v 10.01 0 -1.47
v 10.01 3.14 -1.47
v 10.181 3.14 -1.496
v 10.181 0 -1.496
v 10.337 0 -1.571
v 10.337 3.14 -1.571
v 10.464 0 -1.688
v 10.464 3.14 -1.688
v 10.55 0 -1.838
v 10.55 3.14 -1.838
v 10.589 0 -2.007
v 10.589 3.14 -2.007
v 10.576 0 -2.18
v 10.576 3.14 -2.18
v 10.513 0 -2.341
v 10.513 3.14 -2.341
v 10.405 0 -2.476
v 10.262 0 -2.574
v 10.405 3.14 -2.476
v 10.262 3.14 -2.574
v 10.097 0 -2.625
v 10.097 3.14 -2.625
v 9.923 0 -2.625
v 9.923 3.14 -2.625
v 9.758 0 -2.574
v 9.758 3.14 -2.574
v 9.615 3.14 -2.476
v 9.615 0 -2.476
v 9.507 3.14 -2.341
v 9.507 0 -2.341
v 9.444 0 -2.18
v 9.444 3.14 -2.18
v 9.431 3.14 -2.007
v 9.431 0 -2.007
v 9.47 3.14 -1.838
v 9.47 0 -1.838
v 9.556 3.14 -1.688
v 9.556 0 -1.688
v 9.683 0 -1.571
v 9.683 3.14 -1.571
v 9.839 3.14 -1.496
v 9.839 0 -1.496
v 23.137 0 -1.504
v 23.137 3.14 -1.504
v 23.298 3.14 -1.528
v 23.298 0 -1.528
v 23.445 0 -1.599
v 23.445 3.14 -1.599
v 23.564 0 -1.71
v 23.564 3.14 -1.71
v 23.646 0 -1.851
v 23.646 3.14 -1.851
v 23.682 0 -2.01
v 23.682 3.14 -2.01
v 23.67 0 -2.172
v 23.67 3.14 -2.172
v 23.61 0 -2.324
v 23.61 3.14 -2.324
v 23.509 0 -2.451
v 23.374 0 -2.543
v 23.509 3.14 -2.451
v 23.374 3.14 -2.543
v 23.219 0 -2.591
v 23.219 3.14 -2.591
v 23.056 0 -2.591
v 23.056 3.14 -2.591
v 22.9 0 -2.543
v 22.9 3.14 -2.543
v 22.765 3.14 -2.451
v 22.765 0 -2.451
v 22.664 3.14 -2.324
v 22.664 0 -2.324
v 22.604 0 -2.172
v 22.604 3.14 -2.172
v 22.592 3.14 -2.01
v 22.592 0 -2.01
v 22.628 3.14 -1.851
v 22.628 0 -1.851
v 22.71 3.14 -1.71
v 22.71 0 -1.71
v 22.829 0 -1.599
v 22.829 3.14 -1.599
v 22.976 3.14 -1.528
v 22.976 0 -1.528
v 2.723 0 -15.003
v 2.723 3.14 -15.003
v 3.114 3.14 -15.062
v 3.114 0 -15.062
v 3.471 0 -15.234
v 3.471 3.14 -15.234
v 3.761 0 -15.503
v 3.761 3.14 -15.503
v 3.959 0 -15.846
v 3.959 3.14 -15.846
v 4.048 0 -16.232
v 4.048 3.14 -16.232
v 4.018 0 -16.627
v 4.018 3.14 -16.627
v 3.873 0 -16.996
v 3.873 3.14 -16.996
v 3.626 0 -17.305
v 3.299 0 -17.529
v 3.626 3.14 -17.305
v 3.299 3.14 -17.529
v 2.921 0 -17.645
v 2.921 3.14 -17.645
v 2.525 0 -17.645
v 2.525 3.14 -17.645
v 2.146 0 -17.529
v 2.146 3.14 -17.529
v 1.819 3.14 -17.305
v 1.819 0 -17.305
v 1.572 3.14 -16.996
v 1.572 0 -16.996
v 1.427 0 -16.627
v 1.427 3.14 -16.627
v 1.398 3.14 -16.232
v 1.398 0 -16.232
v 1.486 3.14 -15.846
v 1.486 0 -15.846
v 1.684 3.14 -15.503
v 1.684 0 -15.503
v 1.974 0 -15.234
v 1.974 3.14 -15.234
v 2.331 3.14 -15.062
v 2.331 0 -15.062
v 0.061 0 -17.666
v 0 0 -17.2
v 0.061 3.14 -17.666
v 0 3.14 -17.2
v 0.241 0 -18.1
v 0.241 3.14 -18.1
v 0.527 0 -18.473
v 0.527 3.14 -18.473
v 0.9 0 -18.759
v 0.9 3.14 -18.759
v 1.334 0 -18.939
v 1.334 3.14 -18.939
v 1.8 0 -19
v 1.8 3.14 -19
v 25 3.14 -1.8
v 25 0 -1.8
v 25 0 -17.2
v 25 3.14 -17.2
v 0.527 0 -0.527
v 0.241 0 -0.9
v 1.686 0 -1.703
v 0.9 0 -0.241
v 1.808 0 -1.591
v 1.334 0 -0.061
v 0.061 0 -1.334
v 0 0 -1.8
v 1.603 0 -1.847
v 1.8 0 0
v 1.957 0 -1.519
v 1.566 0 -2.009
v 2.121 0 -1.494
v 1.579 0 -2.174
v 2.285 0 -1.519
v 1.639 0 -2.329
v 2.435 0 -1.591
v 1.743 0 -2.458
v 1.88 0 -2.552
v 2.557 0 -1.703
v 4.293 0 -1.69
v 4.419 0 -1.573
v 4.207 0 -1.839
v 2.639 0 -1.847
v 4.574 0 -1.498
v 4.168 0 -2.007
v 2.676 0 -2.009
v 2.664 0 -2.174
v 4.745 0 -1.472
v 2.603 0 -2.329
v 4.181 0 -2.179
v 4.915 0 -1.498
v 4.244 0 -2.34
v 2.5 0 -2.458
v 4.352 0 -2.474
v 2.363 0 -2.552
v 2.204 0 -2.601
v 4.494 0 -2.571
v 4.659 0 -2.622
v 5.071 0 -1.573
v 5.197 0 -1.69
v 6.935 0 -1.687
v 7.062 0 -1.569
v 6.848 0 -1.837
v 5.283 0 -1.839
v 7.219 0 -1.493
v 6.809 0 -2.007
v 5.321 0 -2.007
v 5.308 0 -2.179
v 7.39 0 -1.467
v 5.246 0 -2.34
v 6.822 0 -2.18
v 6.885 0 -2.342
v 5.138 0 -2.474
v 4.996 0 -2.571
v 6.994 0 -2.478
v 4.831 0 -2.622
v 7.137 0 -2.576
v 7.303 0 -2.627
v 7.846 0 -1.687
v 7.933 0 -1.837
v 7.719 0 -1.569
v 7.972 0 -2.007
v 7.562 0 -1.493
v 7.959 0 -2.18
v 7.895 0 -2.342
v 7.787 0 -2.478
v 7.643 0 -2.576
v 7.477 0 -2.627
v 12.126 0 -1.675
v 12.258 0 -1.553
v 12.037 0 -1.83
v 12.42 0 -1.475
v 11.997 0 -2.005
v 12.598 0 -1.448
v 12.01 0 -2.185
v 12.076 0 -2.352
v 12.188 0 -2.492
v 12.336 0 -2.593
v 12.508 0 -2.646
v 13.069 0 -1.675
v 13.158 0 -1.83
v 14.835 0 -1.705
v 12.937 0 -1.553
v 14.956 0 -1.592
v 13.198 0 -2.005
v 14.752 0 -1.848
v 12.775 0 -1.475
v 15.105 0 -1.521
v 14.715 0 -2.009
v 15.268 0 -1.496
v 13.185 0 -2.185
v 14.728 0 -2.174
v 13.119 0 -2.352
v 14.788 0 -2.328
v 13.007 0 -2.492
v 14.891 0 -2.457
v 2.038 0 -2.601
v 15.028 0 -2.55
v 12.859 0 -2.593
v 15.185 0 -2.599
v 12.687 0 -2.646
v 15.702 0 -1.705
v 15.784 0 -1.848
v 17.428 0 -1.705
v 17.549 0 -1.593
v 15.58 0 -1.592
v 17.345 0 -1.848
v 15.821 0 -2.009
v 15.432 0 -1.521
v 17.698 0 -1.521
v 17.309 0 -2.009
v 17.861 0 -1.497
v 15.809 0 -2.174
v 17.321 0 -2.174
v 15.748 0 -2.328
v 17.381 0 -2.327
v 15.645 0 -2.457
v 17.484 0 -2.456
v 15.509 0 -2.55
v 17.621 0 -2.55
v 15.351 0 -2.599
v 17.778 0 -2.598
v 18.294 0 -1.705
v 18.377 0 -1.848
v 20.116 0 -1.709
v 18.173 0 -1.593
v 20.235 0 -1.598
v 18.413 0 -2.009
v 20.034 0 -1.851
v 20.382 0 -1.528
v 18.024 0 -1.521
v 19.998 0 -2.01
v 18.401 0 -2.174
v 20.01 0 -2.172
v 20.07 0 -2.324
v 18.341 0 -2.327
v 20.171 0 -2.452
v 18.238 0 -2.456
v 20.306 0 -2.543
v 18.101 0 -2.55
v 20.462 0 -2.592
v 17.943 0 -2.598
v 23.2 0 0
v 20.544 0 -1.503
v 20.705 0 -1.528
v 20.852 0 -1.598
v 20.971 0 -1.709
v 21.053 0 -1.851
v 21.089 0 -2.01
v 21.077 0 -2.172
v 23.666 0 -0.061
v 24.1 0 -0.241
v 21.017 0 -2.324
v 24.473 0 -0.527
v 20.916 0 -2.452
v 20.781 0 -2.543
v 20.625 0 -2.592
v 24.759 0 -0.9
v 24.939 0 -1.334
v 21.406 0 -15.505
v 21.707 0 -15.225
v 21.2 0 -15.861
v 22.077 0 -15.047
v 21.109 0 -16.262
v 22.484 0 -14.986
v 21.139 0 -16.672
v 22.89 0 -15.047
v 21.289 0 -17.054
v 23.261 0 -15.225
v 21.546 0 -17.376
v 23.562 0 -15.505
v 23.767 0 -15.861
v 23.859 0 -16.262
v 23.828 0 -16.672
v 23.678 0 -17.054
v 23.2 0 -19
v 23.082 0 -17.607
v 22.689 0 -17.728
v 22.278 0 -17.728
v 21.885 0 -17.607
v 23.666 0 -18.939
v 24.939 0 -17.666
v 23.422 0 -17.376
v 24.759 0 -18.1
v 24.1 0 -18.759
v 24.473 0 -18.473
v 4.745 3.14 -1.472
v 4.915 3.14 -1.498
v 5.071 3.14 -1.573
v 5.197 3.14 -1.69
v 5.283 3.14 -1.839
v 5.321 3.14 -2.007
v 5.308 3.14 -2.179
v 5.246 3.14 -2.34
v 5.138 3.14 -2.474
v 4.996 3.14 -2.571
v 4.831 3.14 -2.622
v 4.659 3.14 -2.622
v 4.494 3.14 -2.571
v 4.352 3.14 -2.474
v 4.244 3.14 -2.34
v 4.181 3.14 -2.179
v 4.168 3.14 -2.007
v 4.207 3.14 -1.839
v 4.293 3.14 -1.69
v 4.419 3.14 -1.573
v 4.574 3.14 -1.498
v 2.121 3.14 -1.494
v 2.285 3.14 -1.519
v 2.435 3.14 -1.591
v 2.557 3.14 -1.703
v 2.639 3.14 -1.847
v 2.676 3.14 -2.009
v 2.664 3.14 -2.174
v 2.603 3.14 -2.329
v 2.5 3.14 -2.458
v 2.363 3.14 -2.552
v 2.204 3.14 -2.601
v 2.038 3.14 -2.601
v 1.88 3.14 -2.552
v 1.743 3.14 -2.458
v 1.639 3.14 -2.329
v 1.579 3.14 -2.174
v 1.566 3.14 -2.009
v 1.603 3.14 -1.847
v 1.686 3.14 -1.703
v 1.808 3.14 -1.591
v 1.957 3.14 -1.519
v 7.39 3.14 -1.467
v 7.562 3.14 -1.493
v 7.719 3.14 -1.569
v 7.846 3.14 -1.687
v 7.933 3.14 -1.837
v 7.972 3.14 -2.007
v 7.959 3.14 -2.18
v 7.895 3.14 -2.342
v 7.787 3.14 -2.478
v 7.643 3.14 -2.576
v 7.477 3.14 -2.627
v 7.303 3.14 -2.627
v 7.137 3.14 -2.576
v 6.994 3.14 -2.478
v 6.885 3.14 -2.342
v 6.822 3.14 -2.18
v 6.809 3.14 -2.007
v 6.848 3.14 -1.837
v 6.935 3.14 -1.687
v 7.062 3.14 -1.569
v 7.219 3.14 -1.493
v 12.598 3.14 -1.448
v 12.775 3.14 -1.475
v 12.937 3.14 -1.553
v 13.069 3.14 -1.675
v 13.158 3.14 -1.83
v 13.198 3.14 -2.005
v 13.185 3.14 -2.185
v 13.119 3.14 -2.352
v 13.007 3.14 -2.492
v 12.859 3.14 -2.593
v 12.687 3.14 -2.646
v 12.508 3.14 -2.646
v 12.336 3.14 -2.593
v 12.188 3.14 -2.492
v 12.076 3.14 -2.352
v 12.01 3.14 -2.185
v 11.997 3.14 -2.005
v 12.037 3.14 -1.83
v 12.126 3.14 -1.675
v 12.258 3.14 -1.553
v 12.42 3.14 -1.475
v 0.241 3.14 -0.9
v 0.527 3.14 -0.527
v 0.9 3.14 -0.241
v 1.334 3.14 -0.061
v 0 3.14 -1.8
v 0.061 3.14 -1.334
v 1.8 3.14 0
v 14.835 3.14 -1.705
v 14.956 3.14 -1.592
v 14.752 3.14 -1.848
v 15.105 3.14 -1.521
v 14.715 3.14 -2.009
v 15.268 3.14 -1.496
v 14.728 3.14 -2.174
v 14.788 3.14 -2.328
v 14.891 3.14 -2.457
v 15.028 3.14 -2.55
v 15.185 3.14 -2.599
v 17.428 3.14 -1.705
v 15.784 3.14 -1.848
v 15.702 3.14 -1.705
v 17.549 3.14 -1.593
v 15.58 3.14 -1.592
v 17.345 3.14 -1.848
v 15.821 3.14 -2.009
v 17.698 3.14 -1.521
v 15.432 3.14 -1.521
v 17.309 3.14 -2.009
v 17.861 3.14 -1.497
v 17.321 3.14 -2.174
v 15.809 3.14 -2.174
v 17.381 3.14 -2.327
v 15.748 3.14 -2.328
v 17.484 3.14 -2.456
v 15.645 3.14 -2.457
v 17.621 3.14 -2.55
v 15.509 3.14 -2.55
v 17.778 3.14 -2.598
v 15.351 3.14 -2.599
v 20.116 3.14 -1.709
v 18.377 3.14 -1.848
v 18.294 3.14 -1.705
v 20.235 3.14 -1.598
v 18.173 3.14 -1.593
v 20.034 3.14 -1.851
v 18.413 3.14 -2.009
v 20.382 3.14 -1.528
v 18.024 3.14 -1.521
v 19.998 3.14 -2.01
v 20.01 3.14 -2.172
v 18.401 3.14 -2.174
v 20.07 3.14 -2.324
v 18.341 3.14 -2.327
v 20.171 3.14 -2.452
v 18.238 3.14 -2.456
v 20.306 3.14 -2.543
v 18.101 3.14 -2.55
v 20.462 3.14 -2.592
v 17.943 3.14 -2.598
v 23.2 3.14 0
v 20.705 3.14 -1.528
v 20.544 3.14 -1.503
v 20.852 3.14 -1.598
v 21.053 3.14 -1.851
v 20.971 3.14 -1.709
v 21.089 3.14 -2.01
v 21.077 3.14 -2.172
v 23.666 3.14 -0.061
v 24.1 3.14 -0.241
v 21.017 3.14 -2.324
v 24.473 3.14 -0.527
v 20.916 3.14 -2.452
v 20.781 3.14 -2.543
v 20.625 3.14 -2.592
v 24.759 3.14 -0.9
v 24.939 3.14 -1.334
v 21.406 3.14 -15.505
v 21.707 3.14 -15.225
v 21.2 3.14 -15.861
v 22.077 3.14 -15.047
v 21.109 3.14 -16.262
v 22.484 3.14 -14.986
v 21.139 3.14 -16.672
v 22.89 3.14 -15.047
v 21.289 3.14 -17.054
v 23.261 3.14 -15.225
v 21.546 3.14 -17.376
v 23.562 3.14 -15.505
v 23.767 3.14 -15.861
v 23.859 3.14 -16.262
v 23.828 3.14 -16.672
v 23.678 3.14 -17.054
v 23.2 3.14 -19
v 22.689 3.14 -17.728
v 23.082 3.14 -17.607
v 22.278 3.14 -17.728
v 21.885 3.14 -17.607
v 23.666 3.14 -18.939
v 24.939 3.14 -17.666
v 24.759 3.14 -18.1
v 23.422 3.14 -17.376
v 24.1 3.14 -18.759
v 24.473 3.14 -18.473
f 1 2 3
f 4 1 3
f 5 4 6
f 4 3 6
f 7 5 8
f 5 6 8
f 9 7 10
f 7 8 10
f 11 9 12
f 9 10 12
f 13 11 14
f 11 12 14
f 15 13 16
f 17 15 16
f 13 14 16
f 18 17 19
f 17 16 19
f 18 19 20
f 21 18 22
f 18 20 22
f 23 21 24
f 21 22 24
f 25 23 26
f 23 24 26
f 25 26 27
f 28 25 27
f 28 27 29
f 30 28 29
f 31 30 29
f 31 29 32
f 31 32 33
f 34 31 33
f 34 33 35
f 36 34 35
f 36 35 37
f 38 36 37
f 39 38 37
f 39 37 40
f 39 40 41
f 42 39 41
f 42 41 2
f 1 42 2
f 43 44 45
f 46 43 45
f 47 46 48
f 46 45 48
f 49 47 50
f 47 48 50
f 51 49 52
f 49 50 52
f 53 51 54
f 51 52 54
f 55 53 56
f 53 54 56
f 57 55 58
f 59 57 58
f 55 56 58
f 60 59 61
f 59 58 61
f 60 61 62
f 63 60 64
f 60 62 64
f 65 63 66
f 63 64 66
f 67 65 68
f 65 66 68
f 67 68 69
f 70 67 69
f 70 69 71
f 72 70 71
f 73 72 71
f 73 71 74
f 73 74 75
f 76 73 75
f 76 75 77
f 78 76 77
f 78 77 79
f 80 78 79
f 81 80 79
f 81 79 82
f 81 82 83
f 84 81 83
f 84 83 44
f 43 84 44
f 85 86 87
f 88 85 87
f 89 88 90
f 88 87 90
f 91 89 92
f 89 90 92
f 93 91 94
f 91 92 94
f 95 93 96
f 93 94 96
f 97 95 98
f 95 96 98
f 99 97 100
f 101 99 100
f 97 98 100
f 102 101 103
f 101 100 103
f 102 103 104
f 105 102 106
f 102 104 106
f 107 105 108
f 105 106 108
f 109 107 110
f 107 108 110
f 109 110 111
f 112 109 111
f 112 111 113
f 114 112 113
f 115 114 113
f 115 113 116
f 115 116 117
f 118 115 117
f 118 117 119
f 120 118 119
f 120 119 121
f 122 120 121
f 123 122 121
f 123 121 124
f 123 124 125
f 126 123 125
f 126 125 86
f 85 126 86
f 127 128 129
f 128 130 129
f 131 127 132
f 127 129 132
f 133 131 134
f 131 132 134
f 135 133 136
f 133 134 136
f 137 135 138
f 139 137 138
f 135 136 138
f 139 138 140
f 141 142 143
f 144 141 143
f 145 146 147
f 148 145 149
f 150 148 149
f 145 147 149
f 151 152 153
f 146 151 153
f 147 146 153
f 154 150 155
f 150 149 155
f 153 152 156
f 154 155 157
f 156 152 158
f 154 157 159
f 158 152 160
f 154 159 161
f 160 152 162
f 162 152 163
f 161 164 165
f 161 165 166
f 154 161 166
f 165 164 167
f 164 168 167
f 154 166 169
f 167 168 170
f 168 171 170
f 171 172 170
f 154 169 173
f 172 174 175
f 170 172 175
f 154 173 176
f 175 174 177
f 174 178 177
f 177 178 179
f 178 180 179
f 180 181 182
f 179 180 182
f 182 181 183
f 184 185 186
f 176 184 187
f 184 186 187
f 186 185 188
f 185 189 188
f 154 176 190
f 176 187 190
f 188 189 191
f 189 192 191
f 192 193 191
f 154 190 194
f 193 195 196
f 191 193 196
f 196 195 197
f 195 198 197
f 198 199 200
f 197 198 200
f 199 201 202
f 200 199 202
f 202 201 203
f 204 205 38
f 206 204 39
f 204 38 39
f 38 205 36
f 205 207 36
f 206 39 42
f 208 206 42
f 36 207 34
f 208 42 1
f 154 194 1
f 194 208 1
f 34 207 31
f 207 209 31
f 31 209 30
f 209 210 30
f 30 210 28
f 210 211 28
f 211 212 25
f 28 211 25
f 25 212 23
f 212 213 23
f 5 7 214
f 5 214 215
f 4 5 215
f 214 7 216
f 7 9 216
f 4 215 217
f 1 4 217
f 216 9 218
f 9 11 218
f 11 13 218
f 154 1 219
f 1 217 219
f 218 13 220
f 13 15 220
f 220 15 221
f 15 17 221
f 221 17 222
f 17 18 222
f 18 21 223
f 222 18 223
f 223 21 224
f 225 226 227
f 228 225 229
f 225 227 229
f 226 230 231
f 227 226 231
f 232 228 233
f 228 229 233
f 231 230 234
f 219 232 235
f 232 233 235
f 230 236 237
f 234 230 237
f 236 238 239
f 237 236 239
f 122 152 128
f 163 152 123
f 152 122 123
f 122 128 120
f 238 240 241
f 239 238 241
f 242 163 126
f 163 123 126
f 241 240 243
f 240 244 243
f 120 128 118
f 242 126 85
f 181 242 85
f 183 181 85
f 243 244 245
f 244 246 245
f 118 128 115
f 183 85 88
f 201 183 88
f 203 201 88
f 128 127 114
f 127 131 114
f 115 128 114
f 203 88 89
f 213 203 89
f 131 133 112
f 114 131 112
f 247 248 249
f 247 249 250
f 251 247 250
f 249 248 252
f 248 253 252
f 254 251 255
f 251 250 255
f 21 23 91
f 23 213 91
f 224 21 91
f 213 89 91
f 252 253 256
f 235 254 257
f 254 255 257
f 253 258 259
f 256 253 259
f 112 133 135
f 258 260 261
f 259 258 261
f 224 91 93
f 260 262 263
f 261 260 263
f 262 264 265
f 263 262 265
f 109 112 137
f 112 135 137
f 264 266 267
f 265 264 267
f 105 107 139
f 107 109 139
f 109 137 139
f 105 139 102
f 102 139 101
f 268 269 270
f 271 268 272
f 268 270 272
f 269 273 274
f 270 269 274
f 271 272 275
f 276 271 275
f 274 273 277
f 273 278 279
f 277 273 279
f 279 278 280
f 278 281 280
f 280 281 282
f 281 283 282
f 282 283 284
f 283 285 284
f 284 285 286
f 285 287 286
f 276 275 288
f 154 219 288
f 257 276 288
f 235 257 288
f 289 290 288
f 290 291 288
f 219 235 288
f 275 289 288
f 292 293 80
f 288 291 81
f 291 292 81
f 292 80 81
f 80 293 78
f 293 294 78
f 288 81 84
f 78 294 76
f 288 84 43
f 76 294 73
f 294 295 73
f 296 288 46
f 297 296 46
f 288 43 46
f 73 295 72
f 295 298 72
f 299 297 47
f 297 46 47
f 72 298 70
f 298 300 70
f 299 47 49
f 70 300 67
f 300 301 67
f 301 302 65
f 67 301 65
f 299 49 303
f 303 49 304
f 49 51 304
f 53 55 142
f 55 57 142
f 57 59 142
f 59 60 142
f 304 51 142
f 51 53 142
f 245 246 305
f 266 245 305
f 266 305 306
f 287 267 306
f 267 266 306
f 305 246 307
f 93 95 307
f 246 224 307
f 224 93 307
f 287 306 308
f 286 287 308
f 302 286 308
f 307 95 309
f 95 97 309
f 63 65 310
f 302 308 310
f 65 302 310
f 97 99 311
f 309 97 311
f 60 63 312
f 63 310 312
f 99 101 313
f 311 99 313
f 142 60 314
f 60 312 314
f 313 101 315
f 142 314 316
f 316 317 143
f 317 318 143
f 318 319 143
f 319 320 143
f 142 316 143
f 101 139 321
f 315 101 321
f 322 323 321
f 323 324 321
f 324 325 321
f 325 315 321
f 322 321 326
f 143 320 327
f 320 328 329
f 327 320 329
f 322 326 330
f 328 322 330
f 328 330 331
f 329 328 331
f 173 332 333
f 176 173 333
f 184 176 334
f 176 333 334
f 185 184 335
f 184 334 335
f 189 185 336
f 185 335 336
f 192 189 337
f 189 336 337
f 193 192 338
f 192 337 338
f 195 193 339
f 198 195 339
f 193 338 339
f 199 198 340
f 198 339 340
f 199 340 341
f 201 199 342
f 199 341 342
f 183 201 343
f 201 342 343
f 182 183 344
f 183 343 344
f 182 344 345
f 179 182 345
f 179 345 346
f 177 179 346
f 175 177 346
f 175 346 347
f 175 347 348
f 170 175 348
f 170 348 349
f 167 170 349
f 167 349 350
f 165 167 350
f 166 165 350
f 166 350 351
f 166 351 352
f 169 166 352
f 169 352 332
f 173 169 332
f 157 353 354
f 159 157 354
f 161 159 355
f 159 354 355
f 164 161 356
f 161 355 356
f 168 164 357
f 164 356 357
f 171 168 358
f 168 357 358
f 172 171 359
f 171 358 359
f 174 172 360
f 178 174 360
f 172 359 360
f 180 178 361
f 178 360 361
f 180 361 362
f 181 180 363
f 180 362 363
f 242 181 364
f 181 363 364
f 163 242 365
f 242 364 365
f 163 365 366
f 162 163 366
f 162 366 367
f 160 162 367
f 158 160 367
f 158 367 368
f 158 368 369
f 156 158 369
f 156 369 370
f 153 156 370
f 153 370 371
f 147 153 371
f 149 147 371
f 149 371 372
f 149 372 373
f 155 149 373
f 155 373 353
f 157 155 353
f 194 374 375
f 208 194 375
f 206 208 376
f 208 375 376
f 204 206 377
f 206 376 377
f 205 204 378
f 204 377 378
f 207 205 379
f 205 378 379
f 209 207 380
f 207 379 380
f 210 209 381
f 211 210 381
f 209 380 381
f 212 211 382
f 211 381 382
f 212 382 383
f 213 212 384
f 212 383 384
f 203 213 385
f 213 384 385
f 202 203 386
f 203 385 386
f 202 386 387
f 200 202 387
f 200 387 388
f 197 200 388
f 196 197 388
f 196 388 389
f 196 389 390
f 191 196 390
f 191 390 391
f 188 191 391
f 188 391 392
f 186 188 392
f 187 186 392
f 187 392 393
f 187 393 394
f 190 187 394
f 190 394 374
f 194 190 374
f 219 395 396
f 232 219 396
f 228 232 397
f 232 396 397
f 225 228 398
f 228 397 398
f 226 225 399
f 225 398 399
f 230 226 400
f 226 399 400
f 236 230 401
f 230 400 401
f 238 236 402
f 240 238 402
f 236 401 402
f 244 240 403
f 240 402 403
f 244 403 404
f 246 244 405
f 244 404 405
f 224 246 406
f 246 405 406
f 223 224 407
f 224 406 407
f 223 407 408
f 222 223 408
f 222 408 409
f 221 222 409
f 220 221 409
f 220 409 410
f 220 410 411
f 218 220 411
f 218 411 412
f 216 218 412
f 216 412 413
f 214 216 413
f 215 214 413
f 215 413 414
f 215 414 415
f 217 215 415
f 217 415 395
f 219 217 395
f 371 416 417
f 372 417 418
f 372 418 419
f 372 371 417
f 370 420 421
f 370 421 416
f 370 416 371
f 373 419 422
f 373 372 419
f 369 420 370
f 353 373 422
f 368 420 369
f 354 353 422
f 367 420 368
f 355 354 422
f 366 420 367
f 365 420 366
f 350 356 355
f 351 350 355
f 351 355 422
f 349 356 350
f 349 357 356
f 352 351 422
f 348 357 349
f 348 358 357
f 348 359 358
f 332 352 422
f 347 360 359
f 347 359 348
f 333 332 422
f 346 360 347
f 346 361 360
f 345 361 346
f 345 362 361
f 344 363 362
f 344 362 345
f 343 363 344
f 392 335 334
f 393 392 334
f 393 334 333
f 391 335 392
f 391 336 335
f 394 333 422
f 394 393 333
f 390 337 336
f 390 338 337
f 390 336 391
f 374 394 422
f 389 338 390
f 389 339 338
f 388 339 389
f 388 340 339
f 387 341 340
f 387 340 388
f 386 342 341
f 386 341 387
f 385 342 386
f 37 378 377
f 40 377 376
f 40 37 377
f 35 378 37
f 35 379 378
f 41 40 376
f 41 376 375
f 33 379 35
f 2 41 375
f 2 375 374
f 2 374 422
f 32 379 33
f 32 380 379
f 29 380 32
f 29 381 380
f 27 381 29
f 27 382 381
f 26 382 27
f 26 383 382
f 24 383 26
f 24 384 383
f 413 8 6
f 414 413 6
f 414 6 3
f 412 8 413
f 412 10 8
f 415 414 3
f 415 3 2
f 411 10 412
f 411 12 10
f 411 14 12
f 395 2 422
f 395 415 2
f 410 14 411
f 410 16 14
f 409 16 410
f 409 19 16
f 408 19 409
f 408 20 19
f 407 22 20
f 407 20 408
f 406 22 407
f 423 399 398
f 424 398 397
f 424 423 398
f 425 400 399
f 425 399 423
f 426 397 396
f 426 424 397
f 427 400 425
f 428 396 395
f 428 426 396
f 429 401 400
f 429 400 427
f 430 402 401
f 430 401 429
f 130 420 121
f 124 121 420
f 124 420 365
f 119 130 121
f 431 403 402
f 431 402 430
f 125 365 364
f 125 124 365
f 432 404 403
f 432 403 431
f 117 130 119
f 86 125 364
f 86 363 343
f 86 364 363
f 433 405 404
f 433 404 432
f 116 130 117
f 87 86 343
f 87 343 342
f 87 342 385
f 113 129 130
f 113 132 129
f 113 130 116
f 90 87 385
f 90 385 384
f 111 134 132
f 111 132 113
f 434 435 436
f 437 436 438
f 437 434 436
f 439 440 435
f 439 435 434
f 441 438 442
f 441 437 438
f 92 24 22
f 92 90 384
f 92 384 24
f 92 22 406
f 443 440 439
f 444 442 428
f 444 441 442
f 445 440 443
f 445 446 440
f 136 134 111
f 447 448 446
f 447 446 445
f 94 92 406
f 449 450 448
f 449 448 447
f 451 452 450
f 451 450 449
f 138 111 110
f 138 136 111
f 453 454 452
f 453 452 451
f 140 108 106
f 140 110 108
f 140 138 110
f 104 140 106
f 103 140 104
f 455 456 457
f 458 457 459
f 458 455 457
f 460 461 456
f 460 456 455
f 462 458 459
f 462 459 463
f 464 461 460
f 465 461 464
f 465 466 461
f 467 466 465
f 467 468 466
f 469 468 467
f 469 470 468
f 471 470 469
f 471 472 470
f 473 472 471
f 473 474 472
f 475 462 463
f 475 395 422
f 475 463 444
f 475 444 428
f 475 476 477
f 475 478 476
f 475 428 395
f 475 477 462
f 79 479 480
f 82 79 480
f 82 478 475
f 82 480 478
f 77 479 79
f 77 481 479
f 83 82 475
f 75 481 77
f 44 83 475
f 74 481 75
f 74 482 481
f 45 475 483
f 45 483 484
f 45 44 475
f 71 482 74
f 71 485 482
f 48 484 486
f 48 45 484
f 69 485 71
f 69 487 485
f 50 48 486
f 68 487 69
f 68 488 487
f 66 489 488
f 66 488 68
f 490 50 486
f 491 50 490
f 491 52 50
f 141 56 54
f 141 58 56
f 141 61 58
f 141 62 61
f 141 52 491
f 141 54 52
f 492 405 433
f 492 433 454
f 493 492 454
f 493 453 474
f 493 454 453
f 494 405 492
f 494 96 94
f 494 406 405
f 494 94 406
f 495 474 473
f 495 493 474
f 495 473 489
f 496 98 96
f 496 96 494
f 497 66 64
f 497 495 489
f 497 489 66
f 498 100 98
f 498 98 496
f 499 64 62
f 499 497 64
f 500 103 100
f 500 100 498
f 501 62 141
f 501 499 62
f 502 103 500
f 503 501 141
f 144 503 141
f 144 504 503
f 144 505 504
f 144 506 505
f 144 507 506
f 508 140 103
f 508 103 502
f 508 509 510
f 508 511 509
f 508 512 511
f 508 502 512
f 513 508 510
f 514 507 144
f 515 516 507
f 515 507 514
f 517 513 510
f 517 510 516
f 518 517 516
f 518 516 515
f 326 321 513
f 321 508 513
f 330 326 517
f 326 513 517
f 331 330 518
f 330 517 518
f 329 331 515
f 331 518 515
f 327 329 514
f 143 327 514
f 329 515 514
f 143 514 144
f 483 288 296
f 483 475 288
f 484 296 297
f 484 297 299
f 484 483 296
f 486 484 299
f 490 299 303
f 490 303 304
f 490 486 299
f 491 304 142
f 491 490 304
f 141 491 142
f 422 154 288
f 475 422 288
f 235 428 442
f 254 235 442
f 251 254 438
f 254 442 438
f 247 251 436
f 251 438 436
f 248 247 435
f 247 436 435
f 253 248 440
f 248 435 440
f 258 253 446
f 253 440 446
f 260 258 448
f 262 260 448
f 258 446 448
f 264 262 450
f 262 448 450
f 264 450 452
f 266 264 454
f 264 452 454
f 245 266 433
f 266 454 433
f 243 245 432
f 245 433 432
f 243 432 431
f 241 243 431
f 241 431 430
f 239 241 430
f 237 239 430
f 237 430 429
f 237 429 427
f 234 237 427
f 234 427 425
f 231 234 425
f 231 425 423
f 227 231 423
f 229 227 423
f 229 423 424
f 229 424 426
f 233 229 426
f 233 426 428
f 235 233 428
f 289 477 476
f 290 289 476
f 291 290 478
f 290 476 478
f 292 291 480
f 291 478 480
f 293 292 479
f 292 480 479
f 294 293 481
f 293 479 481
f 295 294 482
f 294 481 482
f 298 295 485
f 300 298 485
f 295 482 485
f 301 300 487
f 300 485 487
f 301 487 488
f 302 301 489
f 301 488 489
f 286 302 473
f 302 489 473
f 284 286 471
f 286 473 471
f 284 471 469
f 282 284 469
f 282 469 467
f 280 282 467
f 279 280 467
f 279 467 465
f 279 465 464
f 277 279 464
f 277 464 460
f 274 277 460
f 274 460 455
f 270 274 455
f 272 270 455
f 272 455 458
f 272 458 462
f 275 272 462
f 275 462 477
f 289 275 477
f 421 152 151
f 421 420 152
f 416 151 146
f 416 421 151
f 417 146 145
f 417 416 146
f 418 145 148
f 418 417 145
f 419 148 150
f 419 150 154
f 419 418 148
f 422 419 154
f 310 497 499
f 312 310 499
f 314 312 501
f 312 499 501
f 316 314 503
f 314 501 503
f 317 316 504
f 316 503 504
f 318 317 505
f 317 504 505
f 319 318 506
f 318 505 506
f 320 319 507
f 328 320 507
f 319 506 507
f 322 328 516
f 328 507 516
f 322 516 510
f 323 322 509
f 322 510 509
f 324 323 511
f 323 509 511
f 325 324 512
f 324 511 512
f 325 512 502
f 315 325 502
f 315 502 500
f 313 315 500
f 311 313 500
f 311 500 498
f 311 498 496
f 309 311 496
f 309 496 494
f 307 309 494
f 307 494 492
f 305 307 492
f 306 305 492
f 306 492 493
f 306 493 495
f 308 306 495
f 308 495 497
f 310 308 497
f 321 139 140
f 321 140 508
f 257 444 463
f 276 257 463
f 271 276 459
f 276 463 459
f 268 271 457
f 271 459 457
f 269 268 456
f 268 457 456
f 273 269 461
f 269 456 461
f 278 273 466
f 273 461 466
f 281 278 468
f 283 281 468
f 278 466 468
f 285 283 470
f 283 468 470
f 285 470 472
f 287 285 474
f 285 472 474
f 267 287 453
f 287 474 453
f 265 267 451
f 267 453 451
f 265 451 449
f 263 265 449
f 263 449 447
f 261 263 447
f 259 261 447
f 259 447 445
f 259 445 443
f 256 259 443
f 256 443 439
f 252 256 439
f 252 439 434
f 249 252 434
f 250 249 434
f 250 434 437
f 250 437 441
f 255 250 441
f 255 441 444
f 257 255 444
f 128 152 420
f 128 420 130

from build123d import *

# Parameters (mm, degrees)
SKETCH1_W           = 25
SKETCH1_H           = 19
BOSS_EXTRUDE1_DEPTH = 3.14
SKETCH2_R           = 1.328703157
CUT_EXTRUDE1_DEPTH  = 32.557243226
SKETCH3_R           = 1.379079597
CUT_EXTRUDE2_DEPTH  = 32.557243226
SKETCH4_R           = 0.546420727
SKETCH4_R_2         = 0.547156774
SKETCH4_R_3         = 0.553895188
SKETCH4_R_4         = 0.554442322
SKETCH4_R_5         = 0.60258245
SKETCH4_R_6         = 0.580608074
SKETCH4_R_7         = 0.583065552
SKETCH4_R_8         = 0.578153998
SKETCH4_R_9         = 0.55656492
CUT_EXTRUDE3_DEPTH  = 32.557243226
FILLET1_R           = 1.8


with BuildPart() as part:
    # Sketch1 → Boss-Extrude1 (new body)
    with BuildSketch(Plane(origin=(0, 0, 0), x_dir=(1, 0, 0), z_dir=(0, 1, 0))):
        with Locations((12.5, 9.5)):
            Rectangle(SKETCH1_W, SKETCH1_H)
    extrude(amount=BOSS_EXTRUDE1_DEPTH)

    # Sketch2 → Cut-Extrude1 (cut, through all)
    with BuildSketch(Plane(origin=(0, 3.14, 0), x_dir=(1, 0, 0), z_dir=(0, 1, 0))):
        with Locations(Location((2.722594634, 16.331436322, 0), (0, 0, 270))):
            Circle(SKETCH2_R)
    extrude(amount=-CUT_EXTRUDE1_DEPTH, mode=Mode.SUBTRACT)

    # Sketch3 → Cut-Extrude2 (cut, through all)
    with BuildSketch(Plane(origin=(0, 3.14, 0), x_dir=(1, 0, 0), z_dir=(0, 1, 0))):
        with Locations(Location((22.483739106, 16.364797794, 0), (0, 0, 270))):
            Circle(SKETCH3_R)
    extrude(amount=-CUT_EXTRUDE2_DEPTH, mode=Mode.SUBTRACT)

    # Sketch4 → Cut-Extrude3 (cut, through all)
    with BuildSketch(Plane(origin=(0, 3.14, 0), x_dir=(1, 0, 0), z_dir=(0, 1, 0))):
        with Locations(Location((23.137145161, 2.05046074, 0), (0, 0, 270))):
            Circle(SKETCH4_R)
        with Locations(Location((20.543630063, 2.05046074, 0), (0, 0, 270))):
            Circle(SKETCH4_R_2)
        with Locations(Location((17.860899334, 2.05046074, 0), (0, 0, 270))):
            Circle(SKETCH4_R_3)
        with Locations(Location((15.268099294, 2.05046074, 0), (0, 0, 270))):
            Circle(SKETCH4_R_4)
        with Locations(Location((12.597553851, 2.05046074, 0), (0, 0, 270))):
            Circle(SKETCH4_R_5)
        with Locations(Location((10.010026119, 2.05046074, 0), (0, 0, 270))):
            Circle(SKETCH4_R_6)
        with Locations(Location((7.390364783, 2.05046074, 0), (0, 0, 270))):
            Circle(SKETCH4_R_7)
        with Locations(Location((4.744820308, 2.05046074, 0), (0, 0, 270))):
            Circle(SKETCH4_R_8)
        with Locations(Location((2.121365988, 2.05046074, 0), (0, 0, 270))):
            Circle(SKETCH4_R_9)
    extrude(amount=-CUT_EXTRUDE3_DEPTH, mode=Mode.SUBTRACT)

    # Fillet1
    fillet1_edges = [part.edges().sort_by_distance(p)[0] for p in [
        (0, 1.57, -19),
        (25, 1.57, -19),
        (25, 1.57, 0),
        (0, 1.57, 0),
    ]]
    fillet(fillet1_edges, radius=FILLET1_R)


solid = part.part
